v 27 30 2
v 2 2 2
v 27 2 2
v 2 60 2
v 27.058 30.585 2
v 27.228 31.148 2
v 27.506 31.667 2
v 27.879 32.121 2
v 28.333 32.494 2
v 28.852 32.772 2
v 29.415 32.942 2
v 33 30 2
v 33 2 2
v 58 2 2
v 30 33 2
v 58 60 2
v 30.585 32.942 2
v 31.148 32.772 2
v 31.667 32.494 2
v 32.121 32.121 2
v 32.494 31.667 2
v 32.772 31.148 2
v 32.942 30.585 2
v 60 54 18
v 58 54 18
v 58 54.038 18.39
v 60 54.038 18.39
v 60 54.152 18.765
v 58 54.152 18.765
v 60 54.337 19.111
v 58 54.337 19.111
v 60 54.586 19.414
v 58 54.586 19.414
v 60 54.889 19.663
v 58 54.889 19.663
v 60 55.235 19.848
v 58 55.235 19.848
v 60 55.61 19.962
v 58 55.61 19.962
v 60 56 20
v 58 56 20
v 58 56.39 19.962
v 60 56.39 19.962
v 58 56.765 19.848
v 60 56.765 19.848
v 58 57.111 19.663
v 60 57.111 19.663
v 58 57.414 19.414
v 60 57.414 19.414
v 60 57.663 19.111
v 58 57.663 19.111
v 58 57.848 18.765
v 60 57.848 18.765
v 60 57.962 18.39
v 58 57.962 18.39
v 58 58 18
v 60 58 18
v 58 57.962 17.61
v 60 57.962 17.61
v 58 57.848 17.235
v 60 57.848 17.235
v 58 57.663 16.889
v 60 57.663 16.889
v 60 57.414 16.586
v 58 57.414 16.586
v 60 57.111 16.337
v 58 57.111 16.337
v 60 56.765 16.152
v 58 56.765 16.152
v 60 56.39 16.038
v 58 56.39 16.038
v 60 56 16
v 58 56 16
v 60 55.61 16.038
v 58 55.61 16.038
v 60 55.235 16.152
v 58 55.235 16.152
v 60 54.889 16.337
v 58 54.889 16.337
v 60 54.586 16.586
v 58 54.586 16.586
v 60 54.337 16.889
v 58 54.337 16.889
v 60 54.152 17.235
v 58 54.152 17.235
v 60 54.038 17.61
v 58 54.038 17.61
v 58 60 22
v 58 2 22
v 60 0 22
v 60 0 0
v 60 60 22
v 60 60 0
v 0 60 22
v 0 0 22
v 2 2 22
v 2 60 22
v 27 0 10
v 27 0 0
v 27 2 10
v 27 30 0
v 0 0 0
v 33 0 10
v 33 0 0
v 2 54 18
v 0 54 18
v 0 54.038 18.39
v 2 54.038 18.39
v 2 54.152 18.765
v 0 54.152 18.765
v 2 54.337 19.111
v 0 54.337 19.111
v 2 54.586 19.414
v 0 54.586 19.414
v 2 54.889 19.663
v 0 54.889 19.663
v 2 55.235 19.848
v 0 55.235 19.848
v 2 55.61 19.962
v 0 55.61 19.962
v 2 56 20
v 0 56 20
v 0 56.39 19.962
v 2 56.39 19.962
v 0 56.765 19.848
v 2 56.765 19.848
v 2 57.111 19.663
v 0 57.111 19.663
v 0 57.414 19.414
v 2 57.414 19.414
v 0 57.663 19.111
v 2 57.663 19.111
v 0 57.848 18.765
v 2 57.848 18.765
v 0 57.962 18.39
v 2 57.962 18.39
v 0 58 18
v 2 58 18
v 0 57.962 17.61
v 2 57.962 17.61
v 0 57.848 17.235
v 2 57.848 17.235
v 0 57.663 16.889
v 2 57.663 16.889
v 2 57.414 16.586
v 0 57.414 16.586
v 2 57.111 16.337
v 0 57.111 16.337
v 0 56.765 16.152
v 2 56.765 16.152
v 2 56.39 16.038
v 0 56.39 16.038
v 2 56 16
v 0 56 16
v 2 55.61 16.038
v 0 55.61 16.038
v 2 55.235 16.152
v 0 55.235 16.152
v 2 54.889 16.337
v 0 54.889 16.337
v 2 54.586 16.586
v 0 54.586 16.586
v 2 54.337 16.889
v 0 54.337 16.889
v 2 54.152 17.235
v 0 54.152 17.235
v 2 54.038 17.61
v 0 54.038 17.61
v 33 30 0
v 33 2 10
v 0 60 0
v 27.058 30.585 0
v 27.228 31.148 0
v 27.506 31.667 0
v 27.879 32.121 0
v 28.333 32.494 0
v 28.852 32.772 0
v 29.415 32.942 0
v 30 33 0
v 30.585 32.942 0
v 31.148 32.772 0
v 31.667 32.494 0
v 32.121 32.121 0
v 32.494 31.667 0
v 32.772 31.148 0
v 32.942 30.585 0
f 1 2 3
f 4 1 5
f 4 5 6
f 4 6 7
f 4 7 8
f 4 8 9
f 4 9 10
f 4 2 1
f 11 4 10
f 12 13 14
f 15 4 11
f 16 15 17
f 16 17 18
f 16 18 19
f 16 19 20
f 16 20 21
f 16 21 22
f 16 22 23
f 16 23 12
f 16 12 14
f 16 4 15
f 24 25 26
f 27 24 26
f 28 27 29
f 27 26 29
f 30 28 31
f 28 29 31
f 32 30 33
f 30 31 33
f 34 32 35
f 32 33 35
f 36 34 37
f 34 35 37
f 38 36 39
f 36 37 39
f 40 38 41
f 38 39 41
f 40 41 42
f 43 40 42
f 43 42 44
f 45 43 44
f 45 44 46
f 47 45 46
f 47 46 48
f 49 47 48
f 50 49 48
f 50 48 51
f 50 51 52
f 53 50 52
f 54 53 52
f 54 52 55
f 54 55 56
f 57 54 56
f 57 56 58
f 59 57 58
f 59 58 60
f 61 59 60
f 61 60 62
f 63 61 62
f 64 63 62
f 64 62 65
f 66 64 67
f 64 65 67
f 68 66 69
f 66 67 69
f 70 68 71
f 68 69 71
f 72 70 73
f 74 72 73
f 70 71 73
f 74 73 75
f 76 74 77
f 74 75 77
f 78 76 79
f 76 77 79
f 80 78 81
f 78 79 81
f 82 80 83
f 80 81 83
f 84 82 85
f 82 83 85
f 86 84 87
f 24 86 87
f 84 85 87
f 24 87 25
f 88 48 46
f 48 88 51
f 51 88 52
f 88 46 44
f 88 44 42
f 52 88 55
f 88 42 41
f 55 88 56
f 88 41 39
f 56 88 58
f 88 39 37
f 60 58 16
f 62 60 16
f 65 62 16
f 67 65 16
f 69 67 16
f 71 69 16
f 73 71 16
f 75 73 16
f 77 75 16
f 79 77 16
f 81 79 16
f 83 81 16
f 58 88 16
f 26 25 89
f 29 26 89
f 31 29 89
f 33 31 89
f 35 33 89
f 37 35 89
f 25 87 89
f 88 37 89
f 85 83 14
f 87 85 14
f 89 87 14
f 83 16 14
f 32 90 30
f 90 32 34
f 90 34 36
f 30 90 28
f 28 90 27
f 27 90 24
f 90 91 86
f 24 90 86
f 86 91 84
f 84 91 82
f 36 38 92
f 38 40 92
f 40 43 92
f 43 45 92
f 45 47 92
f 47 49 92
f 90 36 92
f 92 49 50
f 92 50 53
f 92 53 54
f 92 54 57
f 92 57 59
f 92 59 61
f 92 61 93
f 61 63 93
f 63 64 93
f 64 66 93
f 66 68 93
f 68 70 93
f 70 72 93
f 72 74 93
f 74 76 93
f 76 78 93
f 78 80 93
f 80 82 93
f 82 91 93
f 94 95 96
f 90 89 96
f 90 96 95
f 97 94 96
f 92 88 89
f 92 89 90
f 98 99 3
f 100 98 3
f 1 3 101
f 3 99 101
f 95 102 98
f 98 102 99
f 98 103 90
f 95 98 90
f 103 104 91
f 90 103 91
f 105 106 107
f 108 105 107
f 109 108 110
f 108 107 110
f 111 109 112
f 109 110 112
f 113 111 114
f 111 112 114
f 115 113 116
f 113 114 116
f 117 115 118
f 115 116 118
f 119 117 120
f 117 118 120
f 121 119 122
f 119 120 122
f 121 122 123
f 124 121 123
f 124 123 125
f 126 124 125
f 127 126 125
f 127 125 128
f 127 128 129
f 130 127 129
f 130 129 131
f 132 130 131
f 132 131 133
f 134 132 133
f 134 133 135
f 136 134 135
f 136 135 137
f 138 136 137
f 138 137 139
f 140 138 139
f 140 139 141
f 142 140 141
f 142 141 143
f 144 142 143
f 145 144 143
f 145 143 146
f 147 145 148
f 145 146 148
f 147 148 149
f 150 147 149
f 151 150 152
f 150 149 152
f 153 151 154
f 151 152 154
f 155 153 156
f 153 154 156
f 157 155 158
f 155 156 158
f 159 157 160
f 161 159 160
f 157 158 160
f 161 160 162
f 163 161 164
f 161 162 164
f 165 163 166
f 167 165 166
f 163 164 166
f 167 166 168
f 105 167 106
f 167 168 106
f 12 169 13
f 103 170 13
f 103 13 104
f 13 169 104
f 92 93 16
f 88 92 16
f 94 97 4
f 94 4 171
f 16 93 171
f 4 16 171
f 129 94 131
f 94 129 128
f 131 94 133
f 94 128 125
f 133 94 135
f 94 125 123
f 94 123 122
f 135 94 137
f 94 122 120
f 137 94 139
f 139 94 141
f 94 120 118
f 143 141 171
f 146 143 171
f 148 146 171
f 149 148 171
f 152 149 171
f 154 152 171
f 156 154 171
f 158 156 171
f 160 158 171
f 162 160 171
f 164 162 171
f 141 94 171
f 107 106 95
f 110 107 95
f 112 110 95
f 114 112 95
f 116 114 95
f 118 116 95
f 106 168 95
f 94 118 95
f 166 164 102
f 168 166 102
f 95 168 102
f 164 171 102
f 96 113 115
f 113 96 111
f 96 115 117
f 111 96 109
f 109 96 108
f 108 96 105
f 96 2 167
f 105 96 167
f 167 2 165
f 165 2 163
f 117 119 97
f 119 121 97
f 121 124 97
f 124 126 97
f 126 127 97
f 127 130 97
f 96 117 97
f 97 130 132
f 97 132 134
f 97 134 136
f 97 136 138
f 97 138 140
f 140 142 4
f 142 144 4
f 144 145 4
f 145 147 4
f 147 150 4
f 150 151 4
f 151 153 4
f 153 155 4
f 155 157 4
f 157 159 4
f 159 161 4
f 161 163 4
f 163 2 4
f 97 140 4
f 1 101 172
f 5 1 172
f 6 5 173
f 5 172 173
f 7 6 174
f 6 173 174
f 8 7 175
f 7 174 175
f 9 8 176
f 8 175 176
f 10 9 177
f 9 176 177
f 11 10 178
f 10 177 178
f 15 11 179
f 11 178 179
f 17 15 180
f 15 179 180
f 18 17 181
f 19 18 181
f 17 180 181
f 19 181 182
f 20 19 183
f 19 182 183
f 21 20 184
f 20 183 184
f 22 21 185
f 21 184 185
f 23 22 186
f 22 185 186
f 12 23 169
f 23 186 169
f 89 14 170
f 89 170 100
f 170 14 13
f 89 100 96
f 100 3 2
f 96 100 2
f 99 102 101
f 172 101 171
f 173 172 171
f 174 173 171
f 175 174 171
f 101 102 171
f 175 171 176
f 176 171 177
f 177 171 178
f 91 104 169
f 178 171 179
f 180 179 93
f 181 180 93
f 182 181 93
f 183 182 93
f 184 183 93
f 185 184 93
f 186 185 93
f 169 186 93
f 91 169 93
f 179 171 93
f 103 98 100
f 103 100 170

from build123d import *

# Parameters (mm, degrees)
F0_W     = 60
F0_H     = 60
F1_DEPTH = 2
F3_DEPTH = 20
F5_DEPTH = 10
F6_R     = 2
F7_DEPTH = 69.4


with BuildPart() as f1:
    # F0 (on Top) → F1 (new body)
    with BuildSketch(Plane.XY):
        with Locations((30, 30)):
            Rectangle(F0_W, F0_H)
    extrude(amount=F1_DEPTH)

    # F2 (on face) → F3 (join)
    with BuildSketch(Plane.XY.offset(2)):
        Polygon((58, 2), (2, 2), (2, 60), (0, 60), (0, 0), (60, 0), (60, 60), (58, 60), align=None)
    extrude(amount=F3_DEPTH)

    # F4 (on face) → F5 (cut)
    with BuildSketch(Plane(origin=(0, 0, 0), x_dir=(1, 0, 0), z_dir=(0, 0, -1))):
        with BuildLine():
            Line((33, 2.964752), (27, 2.964752))
            Line((27, 2.964752), (27, -30))
            ThreePointArc((27, -30), (30, -33), (33, -30))
            Line((33, -30), (33, 2.964752))
        make_face()
    extrude(amount=-F5_DEPTH, mode=Mode.SUBTRACT)

    # F6 (on face) → F7 (cut)
    with BuildSketch(Plane(origin=(0, 0, 0), x_dir=(0, -1, 0), z_dir=(-1, 0, 0))):
        with Locations((-56, 18)):
            Circle(F6_R)
    extrude(amount=-F7_DEPTH, mode=Mode.SUBTRACT)


solid = f1.part
